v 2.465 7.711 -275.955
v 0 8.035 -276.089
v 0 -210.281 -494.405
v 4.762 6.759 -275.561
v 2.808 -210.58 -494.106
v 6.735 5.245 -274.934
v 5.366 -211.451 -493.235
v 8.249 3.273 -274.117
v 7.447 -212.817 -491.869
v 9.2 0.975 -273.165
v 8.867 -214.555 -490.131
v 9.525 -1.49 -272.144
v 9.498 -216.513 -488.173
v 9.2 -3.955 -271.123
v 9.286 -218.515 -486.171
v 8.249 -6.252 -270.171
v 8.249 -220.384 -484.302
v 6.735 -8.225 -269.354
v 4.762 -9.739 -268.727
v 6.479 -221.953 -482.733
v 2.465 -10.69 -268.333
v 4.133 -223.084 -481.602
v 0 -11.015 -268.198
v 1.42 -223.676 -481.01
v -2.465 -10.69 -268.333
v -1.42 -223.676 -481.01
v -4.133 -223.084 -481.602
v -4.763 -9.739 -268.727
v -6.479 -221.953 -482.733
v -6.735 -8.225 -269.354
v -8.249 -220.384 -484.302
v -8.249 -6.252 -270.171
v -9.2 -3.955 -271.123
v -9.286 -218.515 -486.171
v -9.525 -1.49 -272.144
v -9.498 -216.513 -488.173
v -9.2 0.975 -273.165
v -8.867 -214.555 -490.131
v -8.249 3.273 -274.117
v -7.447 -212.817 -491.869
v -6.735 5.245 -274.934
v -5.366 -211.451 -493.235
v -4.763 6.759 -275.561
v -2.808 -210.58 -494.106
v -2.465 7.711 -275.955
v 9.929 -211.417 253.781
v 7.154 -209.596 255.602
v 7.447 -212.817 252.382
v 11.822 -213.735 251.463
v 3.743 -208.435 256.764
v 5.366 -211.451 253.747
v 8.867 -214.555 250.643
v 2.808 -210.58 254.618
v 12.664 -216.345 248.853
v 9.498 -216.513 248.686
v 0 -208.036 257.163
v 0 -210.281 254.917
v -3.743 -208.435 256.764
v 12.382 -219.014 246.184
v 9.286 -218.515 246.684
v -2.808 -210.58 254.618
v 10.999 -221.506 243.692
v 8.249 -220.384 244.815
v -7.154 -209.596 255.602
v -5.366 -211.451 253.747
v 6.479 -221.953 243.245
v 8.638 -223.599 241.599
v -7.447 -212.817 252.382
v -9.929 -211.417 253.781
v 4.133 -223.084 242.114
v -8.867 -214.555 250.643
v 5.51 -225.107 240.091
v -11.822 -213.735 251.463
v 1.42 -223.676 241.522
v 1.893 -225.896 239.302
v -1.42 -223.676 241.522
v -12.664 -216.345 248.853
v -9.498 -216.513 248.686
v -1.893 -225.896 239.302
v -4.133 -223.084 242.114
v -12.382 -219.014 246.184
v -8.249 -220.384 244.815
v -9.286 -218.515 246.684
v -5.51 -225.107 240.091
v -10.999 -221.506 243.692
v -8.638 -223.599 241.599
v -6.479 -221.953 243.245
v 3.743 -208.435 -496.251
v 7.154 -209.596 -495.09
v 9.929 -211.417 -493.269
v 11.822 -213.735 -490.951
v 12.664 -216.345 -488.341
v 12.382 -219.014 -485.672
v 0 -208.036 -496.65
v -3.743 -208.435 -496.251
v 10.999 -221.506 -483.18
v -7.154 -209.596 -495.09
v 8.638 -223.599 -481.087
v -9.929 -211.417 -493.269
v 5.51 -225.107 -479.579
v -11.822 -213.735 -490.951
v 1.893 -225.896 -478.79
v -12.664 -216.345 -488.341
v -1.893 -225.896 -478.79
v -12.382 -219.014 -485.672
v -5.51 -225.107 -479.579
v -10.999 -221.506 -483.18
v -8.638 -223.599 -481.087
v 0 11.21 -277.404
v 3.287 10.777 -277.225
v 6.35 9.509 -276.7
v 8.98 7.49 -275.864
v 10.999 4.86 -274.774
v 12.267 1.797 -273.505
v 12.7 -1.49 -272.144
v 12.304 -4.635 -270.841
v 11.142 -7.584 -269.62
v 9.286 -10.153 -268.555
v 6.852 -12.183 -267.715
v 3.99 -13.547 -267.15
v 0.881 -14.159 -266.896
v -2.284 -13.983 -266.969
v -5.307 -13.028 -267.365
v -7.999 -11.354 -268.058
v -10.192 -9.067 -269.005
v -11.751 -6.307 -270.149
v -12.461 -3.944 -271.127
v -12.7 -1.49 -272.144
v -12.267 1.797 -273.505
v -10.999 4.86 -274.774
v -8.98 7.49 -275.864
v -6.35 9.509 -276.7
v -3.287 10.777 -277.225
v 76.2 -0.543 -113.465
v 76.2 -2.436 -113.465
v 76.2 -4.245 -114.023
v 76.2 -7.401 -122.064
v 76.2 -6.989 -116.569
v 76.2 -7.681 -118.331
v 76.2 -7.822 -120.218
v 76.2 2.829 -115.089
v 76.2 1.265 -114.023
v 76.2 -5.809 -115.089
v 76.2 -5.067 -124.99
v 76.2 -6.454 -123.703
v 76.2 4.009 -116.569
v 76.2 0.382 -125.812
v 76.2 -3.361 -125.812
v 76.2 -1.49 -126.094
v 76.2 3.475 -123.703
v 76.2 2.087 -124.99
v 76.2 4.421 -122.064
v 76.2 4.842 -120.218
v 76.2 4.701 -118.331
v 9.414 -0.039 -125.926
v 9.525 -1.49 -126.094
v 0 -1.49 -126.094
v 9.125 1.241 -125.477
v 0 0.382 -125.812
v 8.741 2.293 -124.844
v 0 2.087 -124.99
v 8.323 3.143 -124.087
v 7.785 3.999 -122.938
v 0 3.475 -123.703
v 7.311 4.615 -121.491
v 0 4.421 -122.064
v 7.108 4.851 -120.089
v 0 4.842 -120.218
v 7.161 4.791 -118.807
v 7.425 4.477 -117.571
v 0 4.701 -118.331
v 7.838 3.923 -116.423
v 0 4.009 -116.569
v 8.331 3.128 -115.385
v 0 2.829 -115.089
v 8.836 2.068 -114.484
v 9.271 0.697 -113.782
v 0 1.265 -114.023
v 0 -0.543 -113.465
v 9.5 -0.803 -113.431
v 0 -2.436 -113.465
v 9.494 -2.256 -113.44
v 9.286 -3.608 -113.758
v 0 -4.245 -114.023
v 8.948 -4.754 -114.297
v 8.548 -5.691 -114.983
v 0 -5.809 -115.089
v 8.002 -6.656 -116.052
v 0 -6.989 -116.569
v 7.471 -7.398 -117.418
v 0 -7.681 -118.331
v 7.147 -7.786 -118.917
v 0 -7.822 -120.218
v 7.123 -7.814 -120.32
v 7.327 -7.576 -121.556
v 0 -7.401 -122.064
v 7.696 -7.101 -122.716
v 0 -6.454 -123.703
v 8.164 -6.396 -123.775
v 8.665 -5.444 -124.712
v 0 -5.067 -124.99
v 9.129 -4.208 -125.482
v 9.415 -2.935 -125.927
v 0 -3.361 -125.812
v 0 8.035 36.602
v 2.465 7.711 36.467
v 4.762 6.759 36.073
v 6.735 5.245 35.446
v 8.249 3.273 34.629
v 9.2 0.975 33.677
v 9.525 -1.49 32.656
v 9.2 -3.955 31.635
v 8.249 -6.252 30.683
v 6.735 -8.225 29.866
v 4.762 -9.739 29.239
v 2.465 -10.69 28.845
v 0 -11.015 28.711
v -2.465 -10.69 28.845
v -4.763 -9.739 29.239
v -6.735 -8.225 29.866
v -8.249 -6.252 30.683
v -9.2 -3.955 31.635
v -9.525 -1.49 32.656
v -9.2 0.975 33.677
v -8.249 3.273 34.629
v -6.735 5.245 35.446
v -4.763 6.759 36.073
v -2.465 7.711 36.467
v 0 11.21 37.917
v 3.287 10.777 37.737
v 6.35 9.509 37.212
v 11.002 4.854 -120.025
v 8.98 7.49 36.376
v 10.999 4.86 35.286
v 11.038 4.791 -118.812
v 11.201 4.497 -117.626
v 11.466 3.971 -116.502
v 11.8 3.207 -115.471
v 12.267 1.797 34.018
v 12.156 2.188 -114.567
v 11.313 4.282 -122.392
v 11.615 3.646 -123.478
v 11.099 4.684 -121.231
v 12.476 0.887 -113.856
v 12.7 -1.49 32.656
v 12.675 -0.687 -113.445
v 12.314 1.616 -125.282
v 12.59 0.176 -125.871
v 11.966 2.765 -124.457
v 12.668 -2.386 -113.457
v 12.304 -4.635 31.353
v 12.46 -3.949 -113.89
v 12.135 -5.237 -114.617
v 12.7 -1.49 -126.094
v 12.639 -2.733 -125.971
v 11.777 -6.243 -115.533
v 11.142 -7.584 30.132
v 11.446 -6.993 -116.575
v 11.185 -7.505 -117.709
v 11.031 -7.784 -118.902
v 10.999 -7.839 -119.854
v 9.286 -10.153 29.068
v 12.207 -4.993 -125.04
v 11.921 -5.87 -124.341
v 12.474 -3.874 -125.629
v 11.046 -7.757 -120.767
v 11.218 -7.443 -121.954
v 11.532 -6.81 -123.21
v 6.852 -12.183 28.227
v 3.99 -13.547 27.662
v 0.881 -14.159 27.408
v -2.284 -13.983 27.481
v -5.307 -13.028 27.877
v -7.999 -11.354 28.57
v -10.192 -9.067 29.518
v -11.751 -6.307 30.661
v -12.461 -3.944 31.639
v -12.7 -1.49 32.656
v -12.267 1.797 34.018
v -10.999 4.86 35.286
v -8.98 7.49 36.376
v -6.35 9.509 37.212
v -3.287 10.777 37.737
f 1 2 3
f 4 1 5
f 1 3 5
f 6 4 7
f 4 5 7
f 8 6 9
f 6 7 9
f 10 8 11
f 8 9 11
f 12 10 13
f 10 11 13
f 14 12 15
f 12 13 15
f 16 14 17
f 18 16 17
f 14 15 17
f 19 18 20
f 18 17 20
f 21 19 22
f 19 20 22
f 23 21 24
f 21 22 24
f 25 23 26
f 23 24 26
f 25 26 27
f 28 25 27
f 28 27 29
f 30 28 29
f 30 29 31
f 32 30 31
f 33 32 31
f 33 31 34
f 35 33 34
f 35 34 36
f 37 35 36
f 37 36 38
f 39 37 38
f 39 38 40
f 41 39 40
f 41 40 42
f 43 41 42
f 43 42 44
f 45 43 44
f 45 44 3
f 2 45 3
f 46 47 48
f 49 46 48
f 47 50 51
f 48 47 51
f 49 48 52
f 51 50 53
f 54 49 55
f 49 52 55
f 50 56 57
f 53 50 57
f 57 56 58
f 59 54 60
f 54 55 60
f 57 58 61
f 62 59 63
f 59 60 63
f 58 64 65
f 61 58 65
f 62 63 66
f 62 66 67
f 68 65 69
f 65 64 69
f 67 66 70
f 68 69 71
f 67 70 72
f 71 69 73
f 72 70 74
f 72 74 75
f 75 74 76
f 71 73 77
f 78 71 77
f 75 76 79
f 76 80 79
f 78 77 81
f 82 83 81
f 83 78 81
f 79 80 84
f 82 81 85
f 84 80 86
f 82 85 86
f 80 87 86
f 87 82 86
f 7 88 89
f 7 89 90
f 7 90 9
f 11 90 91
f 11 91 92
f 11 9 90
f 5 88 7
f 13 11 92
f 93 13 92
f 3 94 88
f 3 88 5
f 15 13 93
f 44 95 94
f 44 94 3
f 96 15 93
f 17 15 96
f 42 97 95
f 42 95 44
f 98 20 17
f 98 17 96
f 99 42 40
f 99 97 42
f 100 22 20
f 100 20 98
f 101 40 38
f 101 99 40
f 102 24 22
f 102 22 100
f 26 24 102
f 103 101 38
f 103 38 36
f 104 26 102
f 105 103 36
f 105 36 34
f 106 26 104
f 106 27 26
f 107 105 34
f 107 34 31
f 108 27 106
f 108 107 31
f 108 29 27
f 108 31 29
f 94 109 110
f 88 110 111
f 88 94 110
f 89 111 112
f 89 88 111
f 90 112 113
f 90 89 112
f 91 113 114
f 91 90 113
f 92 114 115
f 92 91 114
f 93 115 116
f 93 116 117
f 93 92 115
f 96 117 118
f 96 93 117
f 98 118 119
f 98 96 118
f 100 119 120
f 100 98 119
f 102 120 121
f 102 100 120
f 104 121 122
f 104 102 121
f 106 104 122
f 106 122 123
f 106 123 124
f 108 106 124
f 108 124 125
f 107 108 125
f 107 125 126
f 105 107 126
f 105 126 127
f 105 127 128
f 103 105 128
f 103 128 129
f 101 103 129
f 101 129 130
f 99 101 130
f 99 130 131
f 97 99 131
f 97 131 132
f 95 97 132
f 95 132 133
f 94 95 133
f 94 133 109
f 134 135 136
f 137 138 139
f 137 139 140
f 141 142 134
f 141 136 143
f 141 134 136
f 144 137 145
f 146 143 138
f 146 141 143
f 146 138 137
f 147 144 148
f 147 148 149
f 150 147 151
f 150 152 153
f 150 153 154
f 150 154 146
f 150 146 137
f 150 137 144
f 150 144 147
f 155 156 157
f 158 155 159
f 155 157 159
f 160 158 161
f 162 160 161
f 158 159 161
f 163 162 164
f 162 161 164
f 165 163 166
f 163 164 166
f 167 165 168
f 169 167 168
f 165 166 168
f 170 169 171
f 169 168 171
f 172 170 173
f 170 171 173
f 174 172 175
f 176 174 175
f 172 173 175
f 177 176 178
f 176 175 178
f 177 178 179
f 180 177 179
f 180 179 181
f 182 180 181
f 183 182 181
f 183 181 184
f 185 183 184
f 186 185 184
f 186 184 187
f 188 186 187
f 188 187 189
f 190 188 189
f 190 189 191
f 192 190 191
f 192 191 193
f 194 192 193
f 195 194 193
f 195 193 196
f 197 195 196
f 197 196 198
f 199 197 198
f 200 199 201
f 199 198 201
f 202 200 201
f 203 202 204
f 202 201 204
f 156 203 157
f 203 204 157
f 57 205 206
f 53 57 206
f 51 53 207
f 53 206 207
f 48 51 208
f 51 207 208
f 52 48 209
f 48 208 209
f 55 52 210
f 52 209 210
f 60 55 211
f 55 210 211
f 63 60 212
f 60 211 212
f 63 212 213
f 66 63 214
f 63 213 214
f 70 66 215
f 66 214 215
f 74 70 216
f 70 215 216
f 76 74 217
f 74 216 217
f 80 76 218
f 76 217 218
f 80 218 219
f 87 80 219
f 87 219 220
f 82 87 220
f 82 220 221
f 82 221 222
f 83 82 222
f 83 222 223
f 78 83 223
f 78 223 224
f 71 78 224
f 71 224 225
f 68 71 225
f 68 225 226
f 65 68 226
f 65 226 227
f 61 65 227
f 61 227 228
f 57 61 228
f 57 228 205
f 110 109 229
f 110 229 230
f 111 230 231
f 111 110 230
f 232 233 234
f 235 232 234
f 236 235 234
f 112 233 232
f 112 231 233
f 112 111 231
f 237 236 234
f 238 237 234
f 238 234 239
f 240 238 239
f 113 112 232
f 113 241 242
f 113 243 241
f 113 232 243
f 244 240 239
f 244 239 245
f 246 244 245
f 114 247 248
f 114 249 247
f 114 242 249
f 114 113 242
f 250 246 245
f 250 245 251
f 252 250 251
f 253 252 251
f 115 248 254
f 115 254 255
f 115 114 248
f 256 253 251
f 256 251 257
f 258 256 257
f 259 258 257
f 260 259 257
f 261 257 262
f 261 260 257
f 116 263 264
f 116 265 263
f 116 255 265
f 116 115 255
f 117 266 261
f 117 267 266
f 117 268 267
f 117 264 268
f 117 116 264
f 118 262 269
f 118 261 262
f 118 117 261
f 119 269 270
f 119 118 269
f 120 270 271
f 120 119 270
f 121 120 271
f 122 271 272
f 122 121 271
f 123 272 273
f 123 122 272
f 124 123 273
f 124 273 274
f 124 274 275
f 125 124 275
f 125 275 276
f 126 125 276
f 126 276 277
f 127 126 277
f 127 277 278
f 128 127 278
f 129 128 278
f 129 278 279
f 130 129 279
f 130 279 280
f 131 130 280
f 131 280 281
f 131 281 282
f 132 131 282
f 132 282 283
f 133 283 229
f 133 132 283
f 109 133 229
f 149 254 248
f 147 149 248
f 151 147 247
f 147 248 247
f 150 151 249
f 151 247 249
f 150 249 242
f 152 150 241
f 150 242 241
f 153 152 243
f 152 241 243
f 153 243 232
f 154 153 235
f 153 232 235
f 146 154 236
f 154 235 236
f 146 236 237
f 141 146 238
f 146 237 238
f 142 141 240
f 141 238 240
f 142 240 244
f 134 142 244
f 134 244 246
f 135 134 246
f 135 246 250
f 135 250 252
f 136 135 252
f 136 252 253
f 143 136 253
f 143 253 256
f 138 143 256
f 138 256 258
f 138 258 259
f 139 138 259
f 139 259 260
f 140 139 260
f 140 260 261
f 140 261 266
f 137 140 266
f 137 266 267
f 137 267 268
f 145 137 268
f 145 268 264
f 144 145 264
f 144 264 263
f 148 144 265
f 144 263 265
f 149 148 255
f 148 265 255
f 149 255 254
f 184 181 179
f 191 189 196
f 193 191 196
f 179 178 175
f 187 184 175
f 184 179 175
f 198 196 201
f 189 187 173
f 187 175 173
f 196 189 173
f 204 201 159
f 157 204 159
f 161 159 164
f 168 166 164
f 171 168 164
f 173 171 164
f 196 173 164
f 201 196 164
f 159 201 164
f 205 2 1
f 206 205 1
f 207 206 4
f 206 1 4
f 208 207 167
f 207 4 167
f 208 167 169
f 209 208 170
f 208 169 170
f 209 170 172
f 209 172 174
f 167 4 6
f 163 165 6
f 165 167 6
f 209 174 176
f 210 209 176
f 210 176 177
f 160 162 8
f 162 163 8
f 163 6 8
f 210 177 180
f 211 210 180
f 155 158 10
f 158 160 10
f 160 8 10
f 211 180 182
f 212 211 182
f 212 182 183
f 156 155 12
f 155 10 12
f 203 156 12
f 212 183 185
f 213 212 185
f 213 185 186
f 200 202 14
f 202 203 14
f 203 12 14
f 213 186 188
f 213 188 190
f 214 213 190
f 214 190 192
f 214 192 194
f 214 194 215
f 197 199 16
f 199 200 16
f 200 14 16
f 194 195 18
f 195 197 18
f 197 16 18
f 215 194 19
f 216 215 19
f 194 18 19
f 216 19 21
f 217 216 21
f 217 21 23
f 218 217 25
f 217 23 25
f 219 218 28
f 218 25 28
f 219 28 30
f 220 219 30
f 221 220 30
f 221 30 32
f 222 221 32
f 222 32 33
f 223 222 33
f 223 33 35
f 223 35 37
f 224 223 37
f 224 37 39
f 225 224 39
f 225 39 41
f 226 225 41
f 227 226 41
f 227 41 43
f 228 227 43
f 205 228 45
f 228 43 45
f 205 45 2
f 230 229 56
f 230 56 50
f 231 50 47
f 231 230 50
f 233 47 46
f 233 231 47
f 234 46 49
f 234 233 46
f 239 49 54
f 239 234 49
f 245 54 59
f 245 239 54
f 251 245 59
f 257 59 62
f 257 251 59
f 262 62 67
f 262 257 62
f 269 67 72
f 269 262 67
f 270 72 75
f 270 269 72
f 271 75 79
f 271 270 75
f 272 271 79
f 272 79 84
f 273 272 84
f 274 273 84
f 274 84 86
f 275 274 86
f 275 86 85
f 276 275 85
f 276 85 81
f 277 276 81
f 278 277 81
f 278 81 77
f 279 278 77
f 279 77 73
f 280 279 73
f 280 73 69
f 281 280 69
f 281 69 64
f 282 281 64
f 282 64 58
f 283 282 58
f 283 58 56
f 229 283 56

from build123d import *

# Parameters (mm, degrees)
SWEEP1_PROFILE_R     = 12.7
CUT_SWEEP1_PROFILE_R = 9.525
SKETCH19_R           = 6.35
BOSS_EXTRUDE1_DEPTH  = 76.2


with BuildPart() as part:
    # Sweep1: sweep along a path in Sketch2
    with BuildLine(Plane(origin=(0, 0, 0), x_dir=(0, 0, -1), z_dir=(1, 0, 0))) as sweep1_path:
        Line((-248.182278836, -217.015933946), (-32.65613193, -1.489787041))
        Line((-32.65613193, -1.489787041), (272.14386807, -1.489787041))
        Line((272.14386807, -1.489787041), (487.670014975, -217.015933946))
    # Sweep1 profile (on start of the path) → Sweep1 (sweep)
    with BuildSketch(Plane(origin=(0, -217.015933946, 248.182278836), x_dir=(0, 0.7071067811865461, 0.707106781186549), z_dir=(0, 0.707106781186549, -0.7071067811865461))):
        Circle(SWEEP1_PROFILE_R)
    sweep(path=sweep1_path.line, transition=Transition.RIGHT)

    # Cut-Sweep1: sweep along a path in Sketch2<2>
    with BuildLine(Plane(origin=(0, 0, 0), x_dir=(0, 0, -1), z_dir=(1, 0, 0))) as cut_sweep1_path:
        Line((-248.182278836, -217.015933946), (-32.65613193, -1.489787041))
        Line((-32.65613193, -1.489787041), (272.14386807, -1.489787041))
        Line((272.14386807, -1.489787041), (487.670014975, -217.015933946))
    # Cut-Sweep1 profile (on start of the path) → Cut-Sweep1 (sweep, cut)
    with BuildSketch(Plane(origin=(0, -217.015933946, 248.182278836), x_dir=(0, 0.7071067811865461, 0.707106781186549), z_dir=(0, 0.707106781186549, -0.7071067811865461))):
        Circle(CUT_SWEEP1_PROFILE_R)
    sweep(path=cut_sweep1_path.line, transition=Transition.RIGHT, mode=Mode.SUBTRACT)

    # Sketch19 → Boss-Extrude1 (add)
    with BuildSketch(Plane(origin=(0, 0, 0), x_dir=(0, 0, -1), z_dir=(1, 0, 0))):
        with Locations((119.74386807, -1.489787041)):
            Circle(SKETCH19_R)
    extrude(amount=BOSS_EXTRUDE1_DEPTH)


solid = part.part
